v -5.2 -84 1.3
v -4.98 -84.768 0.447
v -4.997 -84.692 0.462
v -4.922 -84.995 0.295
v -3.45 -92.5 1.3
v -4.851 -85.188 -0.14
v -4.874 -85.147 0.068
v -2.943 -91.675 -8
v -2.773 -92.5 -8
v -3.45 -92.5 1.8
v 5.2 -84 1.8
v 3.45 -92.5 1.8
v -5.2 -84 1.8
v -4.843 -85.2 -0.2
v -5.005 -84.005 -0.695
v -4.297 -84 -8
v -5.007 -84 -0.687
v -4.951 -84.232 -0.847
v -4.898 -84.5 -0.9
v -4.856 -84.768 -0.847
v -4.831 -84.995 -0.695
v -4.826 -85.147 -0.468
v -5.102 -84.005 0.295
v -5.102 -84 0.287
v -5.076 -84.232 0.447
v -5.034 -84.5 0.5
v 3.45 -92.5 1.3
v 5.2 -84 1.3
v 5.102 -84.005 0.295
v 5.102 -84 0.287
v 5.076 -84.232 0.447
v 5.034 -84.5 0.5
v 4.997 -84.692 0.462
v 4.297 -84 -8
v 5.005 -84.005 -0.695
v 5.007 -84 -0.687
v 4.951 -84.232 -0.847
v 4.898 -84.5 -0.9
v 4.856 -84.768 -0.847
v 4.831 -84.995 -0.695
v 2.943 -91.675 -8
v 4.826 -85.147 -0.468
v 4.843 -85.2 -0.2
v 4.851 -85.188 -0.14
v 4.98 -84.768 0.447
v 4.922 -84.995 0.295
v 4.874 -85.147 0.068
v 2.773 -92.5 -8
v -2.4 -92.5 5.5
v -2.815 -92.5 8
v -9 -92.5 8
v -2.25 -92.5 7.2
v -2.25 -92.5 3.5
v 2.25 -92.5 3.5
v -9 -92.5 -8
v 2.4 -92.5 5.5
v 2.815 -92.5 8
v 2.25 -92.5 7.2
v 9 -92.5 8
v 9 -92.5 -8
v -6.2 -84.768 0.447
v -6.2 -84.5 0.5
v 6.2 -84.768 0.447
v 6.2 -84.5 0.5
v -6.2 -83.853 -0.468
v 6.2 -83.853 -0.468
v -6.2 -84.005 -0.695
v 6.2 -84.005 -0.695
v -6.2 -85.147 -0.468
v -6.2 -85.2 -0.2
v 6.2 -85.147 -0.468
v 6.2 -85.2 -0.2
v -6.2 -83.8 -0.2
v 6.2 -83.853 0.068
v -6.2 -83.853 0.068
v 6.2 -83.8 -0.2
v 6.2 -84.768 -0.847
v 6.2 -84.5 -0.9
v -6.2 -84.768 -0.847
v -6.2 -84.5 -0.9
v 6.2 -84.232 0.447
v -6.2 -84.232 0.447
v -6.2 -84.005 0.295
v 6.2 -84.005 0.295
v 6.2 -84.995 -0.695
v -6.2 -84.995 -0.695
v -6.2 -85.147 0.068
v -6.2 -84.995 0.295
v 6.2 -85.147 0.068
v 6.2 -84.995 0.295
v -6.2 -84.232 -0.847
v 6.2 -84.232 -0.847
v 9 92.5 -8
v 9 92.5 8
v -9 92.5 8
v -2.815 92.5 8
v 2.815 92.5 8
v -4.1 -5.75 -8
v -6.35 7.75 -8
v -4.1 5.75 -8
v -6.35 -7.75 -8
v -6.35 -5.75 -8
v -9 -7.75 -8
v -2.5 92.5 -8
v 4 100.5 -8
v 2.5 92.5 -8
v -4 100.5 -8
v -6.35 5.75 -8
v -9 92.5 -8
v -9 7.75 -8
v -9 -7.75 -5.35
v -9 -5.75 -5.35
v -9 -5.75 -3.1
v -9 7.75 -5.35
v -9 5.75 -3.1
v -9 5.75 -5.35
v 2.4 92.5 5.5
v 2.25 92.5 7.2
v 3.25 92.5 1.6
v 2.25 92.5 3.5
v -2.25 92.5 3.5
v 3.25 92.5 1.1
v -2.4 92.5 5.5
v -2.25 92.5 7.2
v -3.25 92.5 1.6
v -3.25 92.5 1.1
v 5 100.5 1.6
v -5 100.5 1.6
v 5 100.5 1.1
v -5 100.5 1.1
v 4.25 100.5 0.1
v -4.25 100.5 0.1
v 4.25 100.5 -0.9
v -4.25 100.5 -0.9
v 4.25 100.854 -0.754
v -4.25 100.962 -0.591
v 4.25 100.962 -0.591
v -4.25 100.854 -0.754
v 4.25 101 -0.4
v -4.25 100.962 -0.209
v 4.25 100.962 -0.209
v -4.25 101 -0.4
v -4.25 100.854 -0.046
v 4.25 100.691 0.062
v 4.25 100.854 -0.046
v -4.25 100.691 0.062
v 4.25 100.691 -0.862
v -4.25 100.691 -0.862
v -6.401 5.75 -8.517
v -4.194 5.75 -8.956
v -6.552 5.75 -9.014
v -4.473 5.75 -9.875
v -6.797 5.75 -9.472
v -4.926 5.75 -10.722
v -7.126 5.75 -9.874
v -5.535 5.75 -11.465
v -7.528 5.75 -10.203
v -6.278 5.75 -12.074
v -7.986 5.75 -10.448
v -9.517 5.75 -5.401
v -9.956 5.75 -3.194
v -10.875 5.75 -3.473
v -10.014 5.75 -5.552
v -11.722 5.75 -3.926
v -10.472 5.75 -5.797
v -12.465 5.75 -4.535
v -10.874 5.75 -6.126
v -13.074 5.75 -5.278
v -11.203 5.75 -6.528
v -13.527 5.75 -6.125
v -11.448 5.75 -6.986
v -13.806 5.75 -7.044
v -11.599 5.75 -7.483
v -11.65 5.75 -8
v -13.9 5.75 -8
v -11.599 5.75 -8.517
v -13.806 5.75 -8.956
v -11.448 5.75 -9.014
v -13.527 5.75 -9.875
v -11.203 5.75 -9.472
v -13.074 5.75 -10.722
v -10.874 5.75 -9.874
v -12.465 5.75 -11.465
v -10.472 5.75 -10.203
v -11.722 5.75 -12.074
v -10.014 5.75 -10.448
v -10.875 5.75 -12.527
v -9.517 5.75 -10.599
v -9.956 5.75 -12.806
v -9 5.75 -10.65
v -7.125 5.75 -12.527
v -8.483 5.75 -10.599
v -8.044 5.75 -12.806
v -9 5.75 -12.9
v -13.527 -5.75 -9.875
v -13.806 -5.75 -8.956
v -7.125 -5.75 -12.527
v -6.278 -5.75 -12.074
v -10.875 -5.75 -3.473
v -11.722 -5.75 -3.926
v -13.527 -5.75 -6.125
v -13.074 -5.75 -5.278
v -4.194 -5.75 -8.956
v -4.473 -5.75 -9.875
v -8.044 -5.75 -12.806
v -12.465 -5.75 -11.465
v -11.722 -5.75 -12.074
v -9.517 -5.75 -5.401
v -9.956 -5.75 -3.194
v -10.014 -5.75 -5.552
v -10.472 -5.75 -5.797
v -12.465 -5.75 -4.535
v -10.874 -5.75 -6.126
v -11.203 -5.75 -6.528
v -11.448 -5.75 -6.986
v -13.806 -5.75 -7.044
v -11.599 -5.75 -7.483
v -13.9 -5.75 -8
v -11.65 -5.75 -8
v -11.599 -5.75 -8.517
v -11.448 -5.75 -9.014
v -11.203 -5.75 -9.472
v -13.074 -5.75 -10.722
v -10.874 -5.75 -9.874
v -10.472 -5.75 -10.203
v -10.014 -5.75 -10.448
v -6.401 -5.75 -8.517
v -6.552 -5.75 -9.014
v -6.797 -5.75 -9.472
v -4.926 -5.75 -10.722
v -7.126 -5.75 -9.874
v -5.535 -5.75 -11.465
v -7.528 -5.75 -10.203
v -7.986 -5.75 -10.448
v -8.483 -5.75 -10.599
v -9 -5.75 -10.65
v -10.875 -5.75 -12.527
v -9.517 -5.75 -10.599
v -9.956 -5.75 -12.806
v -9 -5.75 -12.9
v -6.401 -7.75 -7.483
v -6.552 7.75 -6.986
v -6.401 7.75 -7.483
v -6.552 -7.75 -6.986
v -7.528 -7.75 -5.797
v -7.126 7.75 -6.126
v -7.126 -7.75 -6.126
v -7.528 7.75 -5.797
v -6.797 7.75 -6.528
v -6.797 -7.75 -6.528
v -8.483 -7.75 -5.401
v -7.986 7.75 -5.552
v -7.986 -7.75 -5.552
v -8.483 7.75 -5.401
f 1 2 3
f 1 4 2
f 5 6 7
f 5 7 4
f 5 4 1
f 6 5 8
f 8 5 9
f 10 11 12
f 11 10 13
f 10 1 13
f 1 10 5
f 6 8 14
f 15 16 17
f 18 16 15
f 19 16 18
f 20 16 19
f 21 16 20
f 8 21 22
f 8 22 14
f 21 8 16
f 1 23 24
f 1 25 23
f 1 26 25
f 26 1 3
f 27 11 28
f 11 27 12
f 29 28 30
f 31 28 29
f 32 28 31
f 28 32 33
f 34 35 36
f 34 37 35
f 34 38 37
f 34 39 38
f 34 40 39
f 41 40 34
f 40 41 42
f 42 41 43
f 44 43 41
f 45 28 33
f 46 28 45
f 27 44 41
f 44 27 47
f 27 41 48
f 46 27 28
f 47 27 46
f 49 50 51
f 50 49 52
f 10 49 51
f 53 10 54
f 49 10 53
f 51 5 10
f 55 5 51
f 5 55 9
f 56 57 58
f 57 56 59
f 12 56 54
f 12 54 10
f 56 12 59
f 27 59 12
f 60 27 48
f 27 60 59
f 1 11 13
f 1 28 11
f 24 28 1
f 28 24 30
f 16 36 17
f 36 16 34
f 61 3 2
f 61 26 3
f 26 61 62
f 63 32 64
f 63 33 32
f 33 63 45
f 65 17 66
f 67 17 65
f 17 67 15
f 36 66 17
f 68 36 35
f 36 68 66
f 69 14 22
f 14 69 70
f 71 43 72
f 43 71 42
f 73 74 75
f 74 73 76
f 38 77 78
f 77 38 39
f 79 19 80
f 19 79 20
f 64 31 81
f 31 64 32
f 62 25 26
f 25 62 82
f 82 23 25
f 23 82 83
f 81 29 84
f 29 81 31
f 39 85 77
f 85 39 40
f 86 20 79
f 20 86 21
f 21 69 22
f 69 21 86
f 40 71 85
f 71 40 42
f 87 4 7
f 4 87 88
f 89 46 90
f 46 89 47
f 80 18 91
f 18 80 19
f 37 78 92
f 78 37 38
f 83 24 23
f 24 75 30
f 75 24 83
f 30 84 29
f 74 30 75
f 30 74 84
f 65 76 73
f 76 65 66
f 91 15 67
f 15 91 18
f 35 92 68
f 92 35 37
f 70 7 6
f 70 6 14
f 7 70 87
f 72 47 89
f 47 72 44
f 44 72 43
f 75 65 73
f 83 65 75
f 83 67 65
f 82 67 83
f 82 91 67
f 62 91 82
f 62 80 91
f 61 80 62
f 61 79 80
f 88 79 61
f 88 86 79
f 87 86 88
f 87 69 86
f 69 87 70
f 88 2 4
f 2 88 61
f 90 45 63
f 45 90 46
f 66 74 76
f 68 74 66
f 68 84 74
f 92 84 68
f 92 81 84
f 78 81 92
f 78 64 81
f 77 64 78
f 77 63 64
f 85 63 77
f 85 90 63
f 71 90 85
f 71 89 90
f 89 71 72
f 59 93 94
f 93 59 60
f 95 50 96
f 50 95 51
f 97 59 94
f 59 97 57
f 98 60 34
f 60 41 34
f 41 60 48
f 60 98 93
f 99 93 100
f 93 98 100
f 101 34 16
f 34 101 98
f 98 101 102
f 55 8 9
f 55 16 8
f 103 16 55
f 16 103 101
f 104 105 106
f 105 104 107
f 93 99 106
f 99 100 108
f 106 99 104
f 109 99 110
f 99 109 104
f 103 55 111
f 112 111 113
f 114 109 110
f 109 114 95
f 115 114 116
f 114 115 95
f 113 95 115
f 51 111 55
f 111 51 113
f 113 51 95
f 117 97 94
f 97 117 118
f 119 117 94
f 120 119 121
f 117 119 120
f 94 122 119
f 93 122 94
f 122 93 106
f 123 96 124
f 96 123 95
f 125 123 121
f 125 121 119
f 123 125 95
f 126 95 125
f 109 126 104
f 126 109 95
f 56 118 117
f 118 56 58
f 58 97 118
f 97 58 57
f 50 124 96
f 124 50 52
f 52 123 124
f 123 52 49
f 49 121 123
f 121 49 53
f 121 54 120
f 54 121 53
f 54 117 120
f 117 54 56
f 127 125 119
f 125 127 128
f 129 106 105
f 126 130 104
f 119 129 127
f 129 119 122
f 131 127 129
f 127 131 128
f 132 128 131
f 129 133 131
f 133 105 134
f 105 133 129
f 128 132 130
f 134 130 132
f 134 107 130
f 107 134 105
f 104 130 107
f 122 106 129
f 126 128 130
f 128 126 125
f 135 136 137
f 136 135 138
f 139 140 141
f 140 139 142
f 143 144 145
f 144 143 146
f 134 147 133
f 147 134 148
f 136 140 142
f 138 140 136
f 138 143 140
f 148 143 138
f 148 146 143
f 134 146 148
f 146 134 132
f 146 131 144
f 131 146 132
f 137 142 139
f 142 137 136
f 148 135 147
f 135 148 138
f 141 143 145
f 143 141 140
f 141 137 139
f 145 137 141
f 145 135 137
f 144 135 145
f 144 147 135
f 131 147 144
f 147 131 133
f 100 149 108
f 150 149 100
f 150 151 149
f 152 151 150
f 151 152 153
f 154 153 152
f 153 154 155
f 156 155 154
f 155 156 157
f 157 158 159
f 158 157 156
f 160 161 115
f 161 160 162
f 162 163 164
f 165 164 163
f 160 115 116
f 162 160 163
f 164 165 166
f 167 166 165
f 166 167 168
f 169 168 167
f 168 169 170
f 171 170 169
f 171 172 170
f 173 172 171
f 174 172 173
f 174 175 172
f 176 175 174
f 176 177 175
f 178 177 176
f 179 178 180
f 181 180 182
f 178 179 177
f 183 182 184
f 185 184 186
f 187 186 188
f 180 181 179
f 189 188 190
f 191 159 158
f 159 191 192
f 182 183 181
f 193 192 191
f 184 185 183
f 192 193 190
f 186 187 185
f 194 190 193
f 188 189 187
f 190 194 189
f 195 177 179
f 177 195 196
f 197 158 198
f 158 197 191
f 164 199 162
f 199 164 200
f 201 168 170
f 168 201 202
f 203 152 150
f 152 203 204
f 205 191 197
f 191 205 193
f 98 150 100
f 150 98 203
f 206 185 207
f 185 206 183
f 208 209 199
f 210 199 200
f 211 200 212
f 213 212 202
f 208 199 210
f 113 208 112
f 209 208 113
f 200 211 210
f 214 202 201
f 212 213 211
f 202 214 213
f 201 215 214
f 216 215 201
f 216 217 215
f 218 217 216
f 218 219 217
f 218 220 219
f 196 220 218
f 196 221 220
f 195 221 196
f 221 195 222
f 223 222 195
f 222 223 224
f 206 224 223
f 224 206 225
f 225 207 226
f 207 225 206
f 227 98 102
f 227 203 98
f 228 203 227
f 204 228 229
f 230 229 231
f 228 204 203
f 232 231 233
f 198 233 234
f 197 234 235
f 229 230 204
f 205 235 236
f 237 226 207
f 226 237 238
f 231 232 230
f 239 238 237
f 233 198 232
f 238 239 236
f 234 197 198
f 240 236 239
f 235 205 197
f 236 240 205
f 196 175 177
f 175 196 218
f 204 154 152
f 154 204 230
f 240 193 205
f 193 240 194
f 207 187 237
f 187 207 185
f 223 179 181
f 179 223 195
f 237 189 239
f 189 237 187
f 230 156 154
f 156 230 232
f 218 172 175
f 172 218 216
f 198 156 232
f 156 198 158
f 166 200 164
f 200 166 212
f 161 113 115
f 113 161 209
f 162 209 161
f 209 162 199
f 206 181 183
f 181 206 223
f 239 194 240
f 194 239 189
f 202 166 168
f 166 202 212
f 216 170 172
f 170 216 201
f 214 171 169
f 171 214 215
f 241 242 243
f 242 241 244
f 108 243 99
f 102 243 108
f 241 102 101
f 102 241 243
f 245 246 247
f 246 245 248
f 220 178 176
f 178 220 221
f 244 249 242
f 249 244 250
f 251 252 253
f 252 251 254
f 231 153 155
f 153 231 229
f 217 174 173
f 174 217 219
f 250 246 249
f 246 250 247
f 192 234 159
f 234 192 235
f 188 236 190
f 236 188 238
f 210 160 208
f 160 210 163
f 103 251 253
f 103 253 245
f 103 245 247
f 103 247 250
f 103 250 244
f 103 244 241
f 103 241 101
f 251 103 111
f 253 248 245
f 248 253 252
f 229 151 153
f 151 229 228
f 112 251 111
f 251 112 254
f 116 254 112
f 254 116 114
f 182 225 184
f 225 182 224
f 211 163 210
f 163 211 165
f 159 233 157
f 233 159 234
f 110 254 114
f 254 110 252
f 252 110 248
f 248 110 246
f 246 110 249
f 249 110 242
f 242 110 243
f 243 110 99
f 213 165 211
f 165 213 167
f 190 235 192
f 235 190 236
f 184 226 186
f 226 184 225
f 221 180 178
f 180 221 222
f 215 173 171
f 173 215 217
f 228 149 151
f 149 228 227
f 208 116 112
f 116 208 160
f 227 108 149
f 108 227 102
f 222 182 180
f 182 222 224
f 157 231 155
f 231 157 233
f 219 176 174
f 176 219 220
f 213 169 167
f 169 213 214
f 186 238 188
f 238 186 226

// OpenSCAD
// file: door_edge.scad
// ====================================================================
// 6. Standard Door Edge Strut (Part 6 of 8)
// Standardized 138 mm slim door frame strut (18 x 16 mm profile)
// Features mini male wedge on +Y end, mini female open-top pocket on -Y end
// Front-facing spline groove for mounting cellophane directly on the door
// ====================================================================
include <../config.scad>
use <../modules/dovetail.scad>
use <../modules/spline_profile.scad>

module door_edge(
    length = DOOR_EDGE_LEN,
    width  = DOOR_PROFILE_W,
    thick  = DOOR_PROFILE_T
) {
    difference() {
        // Main door frame strut body
        cube([width, length, thick], center = true);
        
        // Spline groove on FRONT (+Z) face along Y axis - continuous full length
        // Mini-dovetails start at flat back face and only go 60% through, leaving front 30% spline zone untouched
        translate([0, 0, thick/2])
        spline_groove_negative(length = length + 2, axis = "Y");
        
        // Mini female open-top wedge pocket at -Y end
        translate([0, -length/2, 0])
        rotate([0, 0, 180])
        mini_female_dovetail_pocket(w = width, h = thick);
    }
    
    // Mini male wedge tenon at +Y end
    translate([0, length/2, 0])
    mini_male_dovetail(w = width, h = thick);
}

// Standalone preview
door_edge();
// file: ../modules/hinge.scad
// ====================================================================
// Integrated 3D Printable Hinge Module
// Pin-and-barrel knuckle hinge for French doors and top roof doors
// ====================================================================
include <../config.scad>

// Female Hinge Knuckle (mounted to frame pillar)
module hinge_female_knuckle(
    barrel_od = 10.0,
    pin_id = 5.0,
    height = 28.0,
    center_gap = 12.0
) {
    difference() {
        cylinder(d = barrel_od, h = height, center = true);
        
        // Center cutout for male knuckle
        cube([barrel_od + 2, barrel_od + 2, center_gap + 2*TOL_HINGE], center = true);
        
        // Through-hole for hinge pin
        cylinder(d = pin_id + TOL_HINGE, h = height + 4, center = true);
    }
}

// Male Hinge Knuckle (mounted to door frame)
module hinge_male_knuckle(
    barrel_od = 10.0,
    pin_id = 5.0,
    knuckle_h = 11.5
) {
    difference() {
        cylinder(d = barrel_od - 0.2, h = knuckle_h, center = true);
        
        // Through-hole for hinge pin
        cylinder(d = pin_id + TOL_HINGE, h = knuckle_h + 2, center = true);
    }
}

// Dedicated 3D Printable Hinge Pin with Retention Head
module hinge_pin(
    pin_id = 5.0,
    length = 32.0
) {
    union() {
        // Main pin shaft
        cylinder(d = pin_id - TOL_HINGE, h = length, center = true);
        
        // Chamfered tip for easy alignment insertion
        translate([0, 0, length/2])
        cylinder(r1 = (pin_id - TOL_HINGE)/2, r2 = (pin_id - TOL_HINGE)/2 - 0.8, h = 2, center = false);
        
        // Retention cap
        translate([0, 0, -length/2 - 2])
        cylinder(d = pin_id + 4, h = 2.5, center = false);
    }
}
// file: ../modules/spline_profile.scad
// ====================================================================
// Cellophane Spline Groove & Compliant Spring Clamping Strip Module
// High-tension retention system with compliant split-core spring prongs
// and directional grip teeth to hold cellophane drum-tight without slipping
// ====================================================================
include <../config.scad>

// Negative volume for cutting the spline groove into any beam surface
// Cuts into the -Z direction from Z=0.
// Axis parameter: "Y" (default) or "X"
module spline_groove_negative(length = 100, axis = "Y") {
    gw = GROOVE_WIDTH; // 4.5 mm
    gd = GROOVE_DEPTH; // 5.0 mm
    
    // Cross-section profile of the groove (in X-Z plane)
    // Features a 45° lead-in chamfer at the mouth and internal retention undercuts
    module groove_cross_section_2d() {
        polygon(points = [
            [-(gw/2 + 0.6),  0.05], // Mouth chamfer outer left
            [-gw/2,         -0.80], // Mouth chamfer inner left
            [-gw/2 - 0.15,  -2.50], // Mid retention undercut left
            [-gw/2,         -gd],   // Bottom left
            [ gw/2,         -gd],   // Bottom right
            [ gw/2 + 0.15,  -2.50], // Mid retention undercut right
            [ gw/2,         -0.80], // Mouth chamfer inner right
            [ (gw/2 + 0.6),  0.05]  // Mouth chamfer outer right
        ]);
    }
    
    if (axis == "Y") {
        rotate([90, 0, 0])
        linear_extrude(height = length, center = true) {
            groove_cross_section_2d();
        }
    } else {
        rotate([0, 90, 0])
        rotate([0, 0, 90])
        linear_extrude(height = length, center = true) {
            groove_cross_section_2d();
        }
    }
}

// 2D Profile of the Compliant Spring-Wedge Spline Clip (X-Z plane)
// Has a central vertical expansion slot that allows the two prongs to flex inward
// during insertion and exert continuous outward spring pressure against the cellophane.
module spline_clip_profile_2d(width_offset = 0) {
    w_cap   = 7.0; // Top thumb-press cap width
    h_cap   = 1.8; // Cap thickness
    h_depth = 4.6; // Insertion depth
    
    // Base dimensions + user/grip offset
    w_shaft = 4.3 + width_offset; // Base shaft (tight fit in 4.5mm groove)
    w_barb1 = 4.7 + width_offset; // Upper retention barb (interferes with groove)
    w_barb2 = 4.8 + width_offset; // Lower primary clamping barb
    w_nose  = 3.2;                // Lead-in nose
    
    difference() {
        union() {
            // 1. Top Thumb-Press Cap (acts as depth stop & pry lip)
            translate([0, h_cap / 2])
            hull() {
                translate([-w_cap/2 + 0.8, -h_cap/2 + 0.4]) circle(r = 0.4, $fn=16);
                translate([ w_cap/2 - 0.8, -h_cap/2 + 0.4]) circle(r = 0.4, $fn=16);
                translate([-w_cap/2 + 1.2,  h_cap/2 - 0.4]) circle(r = 0.4, $fn=16);
                translate([ w_cap/2 - 1.2,  h_cap/2 - 0.4]) circle(r = 0.4, $fn=16);
            }
            
            // 2. Dual-Barb Clamping Prongs
            polygon(points = [
                [-w_shaft/2,        0.0],
                [-w_shaft/2,       -1.2],
                [-w_barb1/2,       -1.9], // Upper barb tooth
                [-w_shaft/2,       -2.1],
                [-w_shaft/2,       -2.8],
                [-w_barb2/2,       -3.5], // Lower primary clamping tooth
                [-w_nose/2,        -h_depth], // Tapered nose
                [ w_nose/2,        -h_depth],
                [ w_barb2/2,       -3.5],
                [ w_shaft/2,       -2.8],
                [ w_shaft/2,       -2.1],
                [ w_barb1/2,       -1.9],
                [ w_shaft/2,       -1.2],
                [ w_shaft/2,        0.0]
            ]);
        }
        
        // 3. Central Vertical Expansion Kerf (0.9 mm compliant flex slot)
        // Splits the shaft into two spring prongs that flex inward upon insertion
        translate([0, -h_depth/2 - 0.6])
        hull() {
            translate([0,  h_depth/2 - 1.2]) circle(r = 0.45, $fn=16);
            translate([0, -h_depth/2 + 0.5]) circle(r = 0.45, $fn=16);
        }
    }
}

// 3D Snap-in Locking Spline Clip (oriented along Y axis by default)
module spline_clip(length = 150, axis = "Y", width_offset = 0) {
    if (axis == "Y") {
        rotate([90, 0, 0])
        linear_extrude(height = length, center = true) {
            spline_clip_profile_2d(width_offset = width_offset);
        }
    } else {
        rotate([0, 90, 0])
        rotate([0, 0, 90])
        linear_extrude(height = length, center = true) {
            spline_clip_profile_2d(width_offset = width_offset);
        }
    }
}
// file: ../modules/dovetail.scad
// ====================================================================
// Dual-Taper Wedge Dovetail Module (Peg-Free, Self-Locking)
// Main Frame Wedge & Mini Door Wedge Systems
// ====================================================================
include <../config.scad>

// 2D Profile of Dovetail Slice in X-Y plane
module dovetail_slice_2d(root_w, tip_w, depth) {
    w_r = root_w / 2;
    w_t = tip_w / 2;
    polygon(points = [
        [-w_r, 0],
        [-w_t, depth],
        [ w_t, depth],
        [ w_r, 0]
    ]);
}

// ----------------------------------------------------
// ----------------------------------------------------
// 1. Main Frame Dual-Taper Wedge Dovetail (24 x 24 mm Profile)
// Starts at flat side (0%) and spans 60% through the frame square
// Leaves the outer 40% (which carries the 30% slot & spline) completely solid
// ----------------------------------------------------
module male_dovetail(
    w = BEAM_WIDTH,
    h = BEAM_HEIGHT,
    depth = DOVETAIL_DEPTH,
    tol = 0
) {
    // Starts at flat inside face (-h/2) and goes 60% through
    z_start = -h/2 + tol;
    z_end   = -h/2 + 0.60 * h - tol;
    
    // Shift toward inside face in X (-w/2) away from +X spline slot
    x_off = -4.5;
    
    b_root = 6.0 - 2*tol;
    b_tip  = 9.5 - 2*tol;
    t_root = 7.5 - 2*tol;
    t_tip  = 11.0 - 2*tol;
    
    translate([x_off, 0, 0])
    union() {
        hull() {
            translate([0, 0, z_start])
            linear_extrude(height = 0.5)
            dovetail_slice_2d(b_root, b_tip, depth);
            
            translate([0, 0, z_end - 0.5])
            linear_extrude(height = 0.5)
            dovetail_slice_2d(t_root, t_tip, depth);
        }
        
        // Tactile snap detent bead near the 60% internal shoulder
        translate([0, depth, z_end - 2.5])
        rotate([0, 90, 0])
        cylinder(r = 0.6, h = t_tip - 2, center = true, $fn=16);
    }
}

module female_dovetail_pocket(
    w = BEAM_WIDTH,
    h = BEAM_HEIGHT,
    depth = DOVETAIL_DEPTH,
    tol = TOL_DOVETAIL
) {
    // Starts at flat inside face (-h/2, open) and goes 60% through
    z_start = -h/2 - 1.0;
    z_end   = -h/2 + 0.60 * h + tol;
    
    // Shift toward inside face in X (-w/2) away from +X spline slot, matching male_dovetail
    x_off = -4.5;
    
    b_root = 6.0 + 2*tol;
    b_tip  = 9.5 + 2*tol;
    t_root = 7.5 + 2*tol;
    t_tip  = 11.0 + 2*tol;
    
    translate([x_off, 0, 0])
    union() {
        hull() {
            translate([0, 0, z_start])
            linear_extrude(height = 0.5)
            dovetail_slice_2d(b_root, b_tip, depth + 0.6);
            
            translate([0, 0, z_end - 0.5])
            linear_extrude(height = 0.5)
            dovetail_slice_2d(t_root, t_tip, depth + 0.6);
        }
        
        // Matching snap detent groove in pocket floor near 60% ceiling
        translate([0, depth, z_end - 2.5])
        rotate([0, 90, 0])
        cylinder(r = 0.8, h = t_tip + 2, center = true, $fn=16);
    }
}

// ----------------------------------------------------
// 2. Mini Door Dual-Taper Wedge Dovetail (18 x 16 mm Profile)
// Starts at flat side (0%) and spans 60% through
// ----------------------------------------------------
module mini_male_dovetail(
    w = DOOR_PROFILE_W,
    h = DOOR_PROFILE_T,
    depth = DOOR_DEPTH,
    tol = 0
) {
    z_start = -h/2 + tol;
    z_end   = -h/2 + 0.60 * h - tol;
    
    b_root = 5.0 - 2*tol;
    b_tip  = 8.0 - 2*tol;
    t_root = 6.5 - 2*tol;
    t_tip  = 10.0 - 2*tol;
    
    union() {
        hull() {
            translate([0, 0, z_start])
            linear_extrude(height = 0.5)
            dovetail_slice_2d(b_root, b_tip, depth);
            
            translate([0, 0, z_end - 0.5])
            linear_extrude(height = 0.5)
            dovetail_slice_2d(t_root, t_tip, depth);
        }
        
        // Snap detent bead near 60% shoulder
        translate([0, depth, z_end - 2.0])
        rotate([0, 90, 0])
        cylinder(r = 0.5, h = t_tip - 1.5, center = true, $fn=16);
    }
}

module mini_female_dovetail_pocket(
    w = DOOR_PROFILE_W,
    h = DOOR_PROFILE_T,
    depth = DOOR_DEPTH,
    tol = TOL_DOVETAIL
) {
    z_start = -h/2 - 1.0;
    z_end   = -h/2 + 0.60 * h + tol;
    
    b_root = 5.0 + 2*tol;
    b_tip  = 8.0 + 2*tol;
    t_root = 6.5 + 2*tol;
    t_tip  = 10.0 + 2*tol;
    
    union() {
        mirror([0, 1, 0])
        hull() {
            translate([0, 0, z_start])
            linear_extrude(height = 0.5)
            dovetail_slice_2d(b_root, b_tip, depth + 0.5);
            
            translate([0, 0, z_end - 0.5])
            linear_extrude(height = 0.5)
            dovetail_slice_2d(t_root, t_tip, depth + 0.5);
        }
        
        // Matching detent groove
        translate([0, -depth, z_end - 2.0])
        rotate([0, 90, 0])
        cylinder(r = 0.7, h = t_tip + 2, center = true, $fn=16);
    }
}
// file: ../config.scad
// ====================================================================
// Bambu Lab A1 Enclosure - Global Configuration Parameters
// Ultra-Minimal 8-Part Modular Kit (Face-Overlay Architecture)
// ====================================================================

// --- Print Bed Limits ---
MAX_PRINT_X = 256;
MAX_PRINT_Y = 256;
MAX_PRINT_Z = 256;
SAFE_PART_MAX_LEN = 240; // Conservative safety margin for brims

// --- Internal Enclosure Dimensions (mm) ---
// Sized for Bambu Lab A1 bed-slinger travel, right poop bucket, and top BMCU 370c
INTERNAL_WIDTH  = 560; // X axis clearance (A1 + toolhead + right poop bucket)
INTERNAL_DEPTH  = 580; // Y axis clearance (Bed travel + rear cable loop buffer)
INTERNAL_HEIGHT = 710; // Z axis clearance (Gantry + BMCU 370c rotating mount + spool)

// --- Standardized Modular Grid Lengths ---
FRAME_EDGE_LEN  = 185.0; // Standardized length for ALL frame edge segments
DOOR_EDGE_LEN   = 185.0; // Standardized length for ALL door vertical segments

// --- Frame Profile Dimensions ---
BEAM_WIDTH   = 24.0;  // Frame beam width X/Y (mm)
BEAM_HEIGHT  = 24.0;  // Frame beam height Z (mm)
CORNER_SIZE  = 36.0;  // 3-way cubic corner junction dimension

// --- Door Profile Dimensions (Slim Face-Overlay) ---
DOOR_PROFILE_W = 18.0; // Width across door frame face (mm)
DOOR_PROFILE_T = 16.0; // Thickness of door frame (mm)
DOOR_CORNER_W  = 30.0; // L-shaped door corner block dimension (mm)

// --- Tolerances (FDM 3D Printing tuned for Bambu Lab A1 0.4mm nozzle) ---
TOL_TIGHT    = 0.15; // Tight press fit (spline clips)
TOL_DOVETAIL = 0.20; // Sliding interlock fit (wedge dovetails)
TOL_HINGE    = 0.30; // Free rotating hinge pins
TOL_LOOSE    = 0.40; // Clearance gaps

// --- Cellophane Spline Groove Specifications ---
GROOVE_WIDTH      = 4.5;   // Width of U-channel
GROOVE_DEPTH      = 4.5;   // Depth of U-channel (~20-30% of frame square)
FRAME_SPLINE_LEN  = 180.0; // Pre-sized continuous frame clip length
DOOR_SPLINE_LEN   = 180.0; // Pre-sized continuous door clip length

// --- Peg-Free 60% Flat-Side Wedge Dovetail Dimensions ---
// Dovetails start at flat side (0%) and span 60% through the frame square
// Leaves the outer 40% (which carries the 30% slot & spline) completely solid
DOVETAIL_DEPTH = 12.0; // Insertion length of wedge insert (mm)

// Main Frame Wedge Dovetail (spans 60% of 24mm square from flat side)
FRAME_BOT_ROOT = 6.0;  // Root width at flat entry
FRAME_BOT_TIP  = 9.5;  // Tip width at flat entry
FRAME_TOP_ROOT = 8.0;  // Root width at 60% shoulder
FRAME_TOP_TIP  = 12.0; // Tip width at 60% shoulder (isolated from outside splines)

// Mini Door Wedge Dovetail (scaled for 18x16 mm door profile)
DOOR_BOT_ROOT  = 5.0;
DOOR_BOT_TIP   = 8.5;
DOOR_TOP_ROOT  = 6.5;
DOOR_TOP_TIP   = 10.5;
DOOR_DEPTH     = 8.0;

// --- Filament PTFE Tube Routing (Bottom Side Beam) ---
PTFE_TUBE_OD  = 4.0; // Standard PTFE bowden tube outer diameter (mm)
PTFE_HOLE_DIA = 4.3; // Slip-fit through-hole diameter with retention grip
PTFE_TUBE_CNT = 4;   // 4 dedicated filament tubes for multi-material / drybox
PTFE_ANGLE    = 35;  // Upward angle toward toolhead/BMCU (degrees)

// --- Render Quality ($fn) ---
$fn = $preview ? 24 : 64;
// main file
// ====================================================================
// 8. Door Edge with Hinge Knuckle (Part 8 of 8)
// Standardized 138 mm slim door strut with integrated male hinge knuckle
// Interlocks directly with the frame's edge_hinge.scad for face-overlay doors
// ====================================================================
include <../config.scad>
use <../modules/dovetail.scad>
use <../modules/spline_profile.scad>
use <../modules/hinge.scad>
use <door_edge.scad>

module door_edge_hinge(
    length = DOOR_EDGE_LEN,
    width  = DOOR_PROFILE_W,
    thick  = DOOR_PROFILE_T,
    is_left_door = undef
) {
    barrel_od = 10.0;
    pin_id = 5.0;
    knuckle_h = 11.5;
    tol = TOL_HINGE;
    
    // Male knuckle sits at corner (-width/2, -thick/2)
    kx = -width/2;
    kz = -thick/2;
    
    difference() {
        union() {
            // Base door edge body
            door_edge(length = length, width = width, thick = thick);
            
            // Integrated male knuckle barrel
            translate([kx, 0, kz])
            rotate([90, 0, 0])
            cylinder(d = barrel_od - 0.2, h = knuckle_h, center = true, $fn = 32);
        }
        
        // Pin through-hole along Y axis
        translate([kx, 0, kz])
        rotate([90, 0, 0])
        cylinder(d = pin_id + tol, h = knuckle_h + 4, center = true, $fn = 32);
    }
}

// Standalone preview
door_edge_hinge();
